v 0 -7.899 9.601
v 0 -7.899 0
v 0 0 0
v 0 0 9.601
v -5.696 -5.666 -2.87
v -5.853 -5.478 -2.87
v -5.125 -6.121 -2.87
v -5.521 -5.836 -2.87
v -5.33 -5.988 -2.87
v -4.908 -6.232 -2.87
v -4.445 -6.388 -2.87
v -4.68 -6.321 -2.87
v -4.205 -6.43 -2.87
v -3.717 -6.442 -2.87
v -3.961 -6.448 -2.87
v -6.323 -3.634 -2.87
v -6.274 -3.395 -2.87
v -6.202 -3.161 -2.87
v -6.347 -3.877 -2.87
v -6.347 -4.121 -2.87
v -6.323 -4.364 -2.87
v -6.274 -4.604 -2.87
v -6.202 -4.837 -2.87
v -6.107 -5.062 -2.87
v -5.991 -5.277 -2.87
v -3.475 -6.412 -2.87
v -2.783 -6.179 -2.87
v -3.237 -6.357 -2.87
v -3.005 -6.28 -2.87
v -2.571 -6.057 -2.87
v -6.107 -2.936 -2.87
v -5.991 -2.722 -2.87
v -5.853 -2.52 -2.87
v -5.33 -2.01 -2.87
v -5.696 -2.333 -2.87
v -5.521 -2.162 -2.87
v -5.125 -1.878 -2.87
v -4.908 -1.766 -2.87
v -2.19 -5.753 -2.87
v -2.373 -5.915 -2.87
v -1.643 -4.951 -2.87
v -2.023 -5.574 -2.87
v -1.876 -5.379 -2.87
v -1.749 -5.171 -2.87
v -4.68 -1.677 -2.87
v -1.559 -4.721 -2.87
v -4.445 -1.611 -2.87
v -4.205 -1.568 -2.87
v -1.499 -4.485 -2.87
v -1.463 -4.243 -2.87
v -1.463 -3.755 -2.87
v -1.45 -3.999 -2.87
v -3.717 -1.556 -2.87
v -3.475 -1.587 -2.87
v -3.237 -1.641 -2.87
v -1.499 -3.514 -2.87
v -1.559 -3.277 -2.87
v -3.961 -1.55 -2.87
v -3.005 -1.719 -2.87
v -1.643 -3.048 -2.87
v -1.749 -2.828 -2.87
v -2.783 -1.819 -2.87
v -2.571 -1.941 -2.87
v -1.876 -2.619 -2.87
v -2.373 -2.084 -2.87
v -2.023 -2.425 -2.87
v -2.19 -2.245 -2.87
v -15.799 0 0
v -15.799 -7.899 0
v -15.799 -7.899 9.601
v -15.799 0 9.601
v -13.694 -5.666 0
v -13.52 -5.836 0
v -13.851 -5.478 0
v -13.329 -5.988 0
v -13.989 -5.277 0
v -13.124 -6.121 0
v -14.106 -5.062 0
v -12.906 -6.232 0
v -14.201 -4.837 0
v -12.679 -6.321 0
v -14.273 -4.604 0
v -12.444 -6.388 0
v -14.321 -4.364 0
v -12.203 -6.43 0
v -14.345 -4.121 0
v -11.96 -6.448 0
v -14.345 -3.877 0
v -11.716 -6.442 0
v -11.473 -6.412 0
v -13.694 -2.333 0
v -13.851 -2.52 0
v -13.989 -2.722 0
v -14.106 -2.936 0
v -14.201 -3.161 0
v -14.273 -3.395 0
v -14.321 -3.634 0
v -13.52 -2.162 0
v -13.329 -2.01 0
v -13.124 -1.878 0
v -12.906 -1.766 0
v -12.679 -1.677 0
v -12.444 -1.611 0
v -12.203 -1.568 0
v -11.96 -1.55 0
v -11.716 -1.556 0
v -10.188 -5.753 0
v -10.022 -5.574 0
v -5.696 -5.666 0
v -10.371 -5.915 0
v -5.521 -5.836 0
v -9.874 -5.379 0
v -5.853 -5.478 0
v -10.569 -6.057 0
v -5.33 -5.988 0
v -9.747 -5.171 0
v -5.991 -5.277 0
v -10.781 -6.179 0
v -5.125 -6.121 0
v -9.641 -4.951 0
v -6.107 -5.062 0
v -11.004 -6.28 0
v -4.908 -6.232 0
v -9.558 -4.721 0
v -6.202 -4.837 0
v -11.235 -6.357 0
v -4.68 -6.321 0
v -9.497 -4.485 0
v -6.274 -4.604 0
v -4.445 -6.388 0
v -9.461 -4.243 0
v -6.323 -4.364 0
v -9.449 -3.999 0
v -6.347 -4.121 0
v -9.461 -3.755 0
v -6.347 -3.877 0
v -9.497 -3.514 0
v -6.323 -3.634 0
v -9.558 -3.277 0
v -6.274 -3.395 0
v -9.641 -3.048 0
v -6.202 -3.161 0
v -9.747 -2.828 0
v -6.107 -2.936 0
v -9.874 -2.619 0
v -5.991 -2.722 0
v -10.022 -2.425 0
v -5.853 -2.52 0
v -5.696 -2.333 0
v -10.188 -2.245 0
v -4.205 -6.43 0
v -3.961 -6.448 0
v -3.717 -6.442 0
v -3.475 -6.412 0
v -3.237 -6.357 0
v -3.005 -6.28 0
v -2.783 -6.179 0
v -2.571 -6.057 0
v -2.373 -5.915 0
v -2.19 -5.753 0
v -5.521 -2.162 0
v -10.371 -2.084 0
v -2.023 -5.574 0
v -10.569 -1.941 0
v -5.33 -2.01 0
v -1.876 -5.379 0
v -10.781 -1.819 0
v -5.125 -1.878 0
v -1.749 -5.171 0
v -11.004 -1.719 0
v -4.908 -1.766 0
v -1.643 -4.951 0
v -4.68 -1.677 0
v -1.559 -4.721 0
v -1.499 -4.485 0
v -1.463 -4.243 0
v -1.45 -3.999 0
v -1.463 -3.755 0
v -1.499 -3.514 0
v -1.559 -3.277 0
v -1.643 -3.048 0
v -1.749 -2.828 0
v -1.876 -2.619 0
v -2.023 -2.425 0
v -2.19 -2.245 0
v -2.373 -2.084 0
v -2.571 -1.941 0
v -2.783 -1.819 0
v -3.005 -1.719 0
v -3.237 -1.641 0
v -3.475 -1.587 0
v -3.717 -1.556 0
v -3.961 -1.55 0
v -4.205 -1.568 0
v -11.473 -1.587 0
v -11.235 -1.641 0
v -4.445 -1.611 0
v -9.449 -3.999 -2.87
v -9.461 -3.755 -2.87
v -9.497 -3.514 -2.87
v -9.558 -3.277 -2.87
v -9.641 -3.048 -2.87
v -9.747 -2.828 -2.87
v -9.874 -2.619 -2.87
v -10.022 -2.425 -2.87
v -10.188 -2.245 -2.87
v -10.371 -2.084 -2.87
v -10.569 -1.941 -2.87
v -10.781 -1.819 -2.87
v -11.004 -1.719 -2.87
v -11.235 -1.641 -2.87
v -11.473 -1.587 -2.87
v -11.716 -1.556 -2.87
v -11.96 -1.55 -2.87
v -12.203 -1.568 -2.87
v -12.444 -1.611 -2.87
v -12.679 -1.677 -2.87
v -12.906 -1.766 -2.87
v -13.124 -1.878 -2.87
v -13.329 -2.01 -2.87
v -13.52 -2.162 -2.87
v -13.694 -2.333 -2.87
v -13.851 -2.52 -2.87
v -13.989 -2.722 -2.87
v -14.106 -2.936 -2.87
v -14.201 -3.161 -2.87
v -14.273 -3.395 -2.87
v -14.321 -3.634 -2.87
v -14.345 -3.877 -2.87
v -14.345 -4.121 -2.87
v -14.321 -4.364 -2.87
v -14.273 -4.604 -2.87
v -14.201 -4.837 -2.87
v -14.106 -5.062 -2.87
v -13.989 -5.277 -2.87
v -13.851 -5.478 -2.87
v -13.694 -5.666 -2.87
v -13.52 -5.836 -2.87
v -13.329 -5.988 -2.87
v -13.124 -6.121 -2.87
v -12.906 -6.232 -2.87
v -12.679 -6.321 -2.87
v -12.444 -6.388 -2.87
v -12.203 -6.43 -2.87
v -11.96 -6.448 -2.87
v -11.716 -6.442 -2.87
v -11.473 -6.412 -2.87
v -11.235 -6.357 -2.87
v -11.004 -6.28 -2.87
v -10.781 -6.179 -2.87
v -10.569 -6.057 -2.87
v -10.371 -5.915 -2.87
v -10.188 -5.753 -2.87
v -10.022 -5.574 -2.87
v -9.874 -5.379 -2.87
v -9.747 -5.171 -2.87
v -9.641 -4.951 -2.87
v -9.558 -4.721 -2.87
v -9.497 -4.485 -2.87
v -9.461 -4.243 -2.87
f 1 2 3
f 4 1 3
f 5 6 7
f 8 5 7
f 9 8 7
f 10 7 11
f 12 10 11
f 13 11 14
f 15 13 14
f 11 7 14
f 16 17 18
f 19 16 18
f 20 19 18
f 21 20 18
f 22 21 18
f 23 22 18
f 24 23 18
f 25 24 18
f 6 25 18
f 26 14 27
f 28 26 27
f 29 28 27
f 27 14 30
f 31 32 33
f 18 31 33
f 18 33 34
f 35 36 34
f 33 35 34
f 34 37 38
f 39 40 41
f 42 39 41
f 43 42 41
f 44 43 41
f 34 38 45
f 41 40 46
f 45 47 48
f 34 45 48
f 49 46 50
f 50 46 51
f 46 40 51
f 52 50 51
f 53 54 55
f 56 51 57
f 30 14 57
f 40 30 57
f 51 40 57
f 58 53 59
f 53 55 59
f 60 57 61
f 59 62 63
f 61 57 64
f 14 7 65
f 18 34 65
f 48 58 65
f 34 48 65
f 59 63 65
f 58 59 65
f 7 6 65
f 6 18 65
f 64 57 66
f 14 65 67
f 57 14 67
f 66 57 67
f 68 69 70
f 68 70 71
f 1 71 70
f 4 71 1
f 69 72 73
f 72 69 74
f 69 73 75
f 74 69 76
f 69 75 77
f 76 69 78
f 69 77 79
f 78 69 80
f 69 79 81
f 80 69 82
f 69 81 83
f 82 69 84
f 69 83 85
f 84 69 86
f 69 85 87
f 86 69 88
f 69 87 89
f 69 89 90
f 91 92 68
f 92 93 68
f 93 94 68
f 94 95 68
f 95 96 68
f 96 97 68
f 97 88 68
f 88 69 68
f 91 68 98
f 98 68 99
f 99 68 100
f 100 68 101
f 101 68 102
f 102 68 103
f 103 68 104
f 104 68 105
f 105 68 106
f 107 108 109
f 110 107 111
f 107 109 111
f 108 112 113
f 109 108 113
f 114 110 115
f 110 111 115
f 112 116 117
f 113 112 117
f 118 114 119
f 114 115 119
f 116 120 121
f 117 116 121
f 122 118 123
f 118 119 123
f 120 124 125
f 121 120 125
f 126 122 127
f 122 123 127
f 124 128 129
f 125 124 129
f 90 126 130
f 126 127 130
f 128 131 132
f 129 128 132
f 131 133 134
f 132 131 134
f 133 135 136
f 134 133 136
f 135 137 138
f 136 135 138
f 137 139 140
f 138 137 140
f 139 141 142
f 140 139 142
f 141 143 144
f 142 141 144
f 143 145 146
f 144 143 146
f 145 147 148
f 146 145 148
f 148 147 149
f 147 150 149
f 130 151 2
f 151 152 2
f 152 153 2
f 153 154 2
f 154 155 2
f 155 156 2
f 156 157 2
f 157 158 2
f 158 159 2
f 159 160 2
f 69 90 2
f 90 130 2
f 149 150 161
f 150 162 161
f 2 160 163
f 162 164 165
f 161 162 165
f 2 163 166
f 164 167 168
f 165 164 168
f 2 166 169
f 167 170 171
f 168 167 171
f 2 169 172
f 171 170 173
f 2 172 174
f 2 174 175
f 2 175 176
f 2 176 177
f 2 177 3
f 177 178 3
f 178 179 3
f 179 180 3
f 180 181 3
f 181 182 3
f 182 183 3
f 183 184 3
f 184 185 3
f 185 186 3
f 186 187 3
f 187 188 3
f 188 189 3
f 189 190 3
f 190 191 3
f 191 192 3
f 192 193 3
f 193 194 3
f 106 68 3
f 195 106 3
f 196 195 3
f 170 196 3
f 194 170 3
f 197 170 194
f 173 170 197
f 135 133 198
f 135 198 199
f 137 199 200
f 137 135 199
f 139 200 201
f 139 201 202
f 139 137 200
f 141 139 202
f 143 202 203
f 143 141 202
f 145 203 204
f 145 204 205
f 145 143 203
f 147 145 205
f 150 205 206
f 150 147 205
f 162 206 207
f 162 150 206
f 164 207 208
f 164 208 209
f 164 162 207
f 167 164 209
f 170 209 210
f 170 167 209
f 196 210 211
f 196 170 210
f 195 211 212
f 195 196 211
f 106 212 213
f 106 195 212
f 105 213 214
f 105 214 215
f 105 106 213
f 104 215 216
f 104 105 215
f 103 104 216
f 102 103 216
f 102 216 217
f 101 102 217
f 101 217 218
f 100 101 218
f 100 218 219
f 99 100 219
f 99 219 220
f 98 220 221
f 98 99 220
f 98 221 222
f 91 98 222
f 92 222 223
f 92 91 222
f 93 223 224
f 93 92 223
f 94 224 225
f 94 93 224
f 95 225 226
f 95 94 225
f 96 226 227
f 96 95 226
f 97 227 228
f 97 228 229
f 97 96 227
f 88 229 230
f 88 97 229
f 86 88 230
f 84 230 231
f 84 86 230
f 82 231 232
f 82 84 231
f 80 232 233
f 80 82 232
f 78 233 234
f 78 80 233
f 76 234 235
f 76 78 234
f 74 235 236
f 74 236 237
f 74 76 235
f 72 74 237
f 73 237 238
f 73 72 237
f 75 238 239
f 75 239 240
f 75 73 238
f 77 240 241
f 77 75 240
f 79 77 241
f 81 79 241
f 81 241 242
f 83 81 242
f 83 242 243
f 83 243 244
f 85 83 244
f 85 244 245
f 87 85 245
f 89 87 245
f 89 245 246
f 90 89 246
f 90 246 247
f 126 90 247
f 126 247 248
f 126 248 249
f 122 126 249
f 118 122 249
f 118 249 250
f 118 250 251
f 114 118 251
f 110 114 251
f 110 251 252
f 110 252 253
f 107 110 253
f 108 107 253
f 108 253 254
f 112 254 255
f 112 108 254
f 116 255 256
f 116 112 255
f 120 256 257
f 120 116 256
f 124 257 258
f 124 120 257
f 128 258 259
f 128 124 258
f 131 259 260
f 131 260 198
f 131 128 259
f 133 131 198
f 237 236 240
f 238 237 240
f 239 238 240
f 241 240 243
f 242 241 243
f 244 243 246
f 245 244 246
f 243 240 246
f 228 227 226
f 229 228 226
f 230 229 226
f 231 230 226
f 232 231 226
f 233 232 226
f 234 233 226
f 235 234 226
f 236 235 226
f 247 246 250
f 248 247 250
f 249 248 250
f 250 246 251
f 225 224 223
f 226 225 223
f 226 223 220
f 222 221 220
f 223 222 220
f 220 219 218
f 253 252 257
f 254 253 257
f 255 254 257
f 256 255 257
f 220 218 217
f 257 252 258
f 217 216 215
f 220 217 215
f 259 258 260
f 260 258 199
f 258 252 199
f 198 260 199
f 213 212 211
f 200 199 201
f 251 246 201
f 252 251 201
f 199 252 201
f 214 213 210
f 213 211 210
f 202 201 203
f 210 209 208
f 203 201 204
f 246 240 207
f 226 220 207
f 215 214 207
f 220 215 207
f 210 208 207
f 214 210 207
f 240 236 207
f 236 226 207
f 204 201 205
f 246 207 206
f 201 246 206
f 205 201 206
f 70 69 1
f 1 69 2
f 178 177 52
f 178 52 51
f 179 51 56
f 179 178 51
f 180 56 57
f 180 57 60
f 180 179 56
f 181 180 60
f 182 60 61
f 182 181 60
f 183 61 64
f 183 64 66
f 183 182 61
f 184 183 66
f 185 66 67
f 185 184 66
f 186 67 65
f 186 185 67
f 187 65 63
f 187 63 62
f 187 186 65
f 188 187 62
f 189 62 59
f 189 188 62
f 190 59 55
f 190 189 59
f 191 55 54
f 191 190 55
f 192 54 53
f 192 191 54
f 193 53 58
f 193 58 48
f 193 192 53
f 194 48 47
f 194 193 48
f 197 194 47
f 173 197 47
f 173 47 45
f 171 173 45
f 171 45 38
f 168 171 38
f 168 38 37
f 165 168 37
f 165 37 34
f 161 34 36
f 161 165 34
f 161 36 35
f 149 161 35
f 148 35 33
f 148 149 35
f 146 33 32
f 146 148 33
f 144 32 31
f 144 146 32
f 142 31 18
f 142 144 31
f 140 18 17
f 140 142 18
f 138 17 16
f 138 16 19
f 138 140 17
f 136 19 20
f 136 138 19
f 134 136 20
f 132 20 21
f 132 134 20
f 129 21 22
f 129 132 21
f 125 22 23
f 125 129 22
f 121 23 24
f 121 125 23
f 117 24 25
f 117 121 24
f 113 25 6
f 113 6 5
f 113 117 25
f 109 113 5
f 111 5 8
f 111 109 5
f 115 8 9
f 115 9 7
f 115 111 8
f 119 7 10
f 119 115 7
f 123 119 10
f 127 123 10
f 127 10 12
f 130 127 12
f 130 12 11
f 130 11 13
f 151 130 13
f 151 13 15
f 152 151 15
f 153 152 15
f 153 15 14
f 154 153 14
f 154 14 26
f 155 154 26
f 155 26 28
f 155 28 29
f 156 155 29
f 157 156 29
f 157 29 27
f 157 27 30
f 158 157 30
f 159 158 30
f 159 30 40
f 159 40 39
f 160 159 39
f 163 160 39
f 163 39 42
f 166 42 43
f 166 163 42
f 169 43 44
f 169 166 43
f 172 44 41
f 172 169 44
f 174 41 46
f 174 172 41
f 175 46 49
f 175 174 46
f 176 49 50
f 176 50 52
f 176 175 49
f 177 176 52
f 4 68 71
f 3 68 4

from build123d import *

# Parameters (mm, degrees)
F0_W     = 15.7988
F0_H     = 7.8994
F0_R     = 2.44983
F1_DEPTH = 9.6012
F2_DEPTH = 2.8702


# Not quite as in the source:
# - a feature names something its author has since deleted; it is built from what else it names


with BuildPart() as f1:
    # F0 (on Top) → F1 (new body)
    with BuildSketch(Plane.XY):
        with Locations((-7.8994, -3.9497)):
            Rectangle(F0_W, F0_H)
        with Locations((-11.89863, -3.99923)):
            Circle(F0_R, mode=Mode.SUBTRACT)
        with Locations((-3.90017, -3.99923)):
            Circle(F0_R, mode=Mode.SUBTRACT)
        with Locations((-11.89863, -3.99923)):
            Circle(F0_R)
        with Locations((-3.90017, -3.99923)):
            Circle(F0_R)
    extrude(amount=F1_DEPTH)

    # F0 (on Top) → F2 (join)
    with BuildSketch(Plane.XY):
        with Locations((-3.90017, -3.99923)):
            Circle(F0_R)
        with Locations((-11.89863, -3.99923)):
            Circle(F0_R)
    extrude(amount=-F2_DEPTH)


solid = f1.part
